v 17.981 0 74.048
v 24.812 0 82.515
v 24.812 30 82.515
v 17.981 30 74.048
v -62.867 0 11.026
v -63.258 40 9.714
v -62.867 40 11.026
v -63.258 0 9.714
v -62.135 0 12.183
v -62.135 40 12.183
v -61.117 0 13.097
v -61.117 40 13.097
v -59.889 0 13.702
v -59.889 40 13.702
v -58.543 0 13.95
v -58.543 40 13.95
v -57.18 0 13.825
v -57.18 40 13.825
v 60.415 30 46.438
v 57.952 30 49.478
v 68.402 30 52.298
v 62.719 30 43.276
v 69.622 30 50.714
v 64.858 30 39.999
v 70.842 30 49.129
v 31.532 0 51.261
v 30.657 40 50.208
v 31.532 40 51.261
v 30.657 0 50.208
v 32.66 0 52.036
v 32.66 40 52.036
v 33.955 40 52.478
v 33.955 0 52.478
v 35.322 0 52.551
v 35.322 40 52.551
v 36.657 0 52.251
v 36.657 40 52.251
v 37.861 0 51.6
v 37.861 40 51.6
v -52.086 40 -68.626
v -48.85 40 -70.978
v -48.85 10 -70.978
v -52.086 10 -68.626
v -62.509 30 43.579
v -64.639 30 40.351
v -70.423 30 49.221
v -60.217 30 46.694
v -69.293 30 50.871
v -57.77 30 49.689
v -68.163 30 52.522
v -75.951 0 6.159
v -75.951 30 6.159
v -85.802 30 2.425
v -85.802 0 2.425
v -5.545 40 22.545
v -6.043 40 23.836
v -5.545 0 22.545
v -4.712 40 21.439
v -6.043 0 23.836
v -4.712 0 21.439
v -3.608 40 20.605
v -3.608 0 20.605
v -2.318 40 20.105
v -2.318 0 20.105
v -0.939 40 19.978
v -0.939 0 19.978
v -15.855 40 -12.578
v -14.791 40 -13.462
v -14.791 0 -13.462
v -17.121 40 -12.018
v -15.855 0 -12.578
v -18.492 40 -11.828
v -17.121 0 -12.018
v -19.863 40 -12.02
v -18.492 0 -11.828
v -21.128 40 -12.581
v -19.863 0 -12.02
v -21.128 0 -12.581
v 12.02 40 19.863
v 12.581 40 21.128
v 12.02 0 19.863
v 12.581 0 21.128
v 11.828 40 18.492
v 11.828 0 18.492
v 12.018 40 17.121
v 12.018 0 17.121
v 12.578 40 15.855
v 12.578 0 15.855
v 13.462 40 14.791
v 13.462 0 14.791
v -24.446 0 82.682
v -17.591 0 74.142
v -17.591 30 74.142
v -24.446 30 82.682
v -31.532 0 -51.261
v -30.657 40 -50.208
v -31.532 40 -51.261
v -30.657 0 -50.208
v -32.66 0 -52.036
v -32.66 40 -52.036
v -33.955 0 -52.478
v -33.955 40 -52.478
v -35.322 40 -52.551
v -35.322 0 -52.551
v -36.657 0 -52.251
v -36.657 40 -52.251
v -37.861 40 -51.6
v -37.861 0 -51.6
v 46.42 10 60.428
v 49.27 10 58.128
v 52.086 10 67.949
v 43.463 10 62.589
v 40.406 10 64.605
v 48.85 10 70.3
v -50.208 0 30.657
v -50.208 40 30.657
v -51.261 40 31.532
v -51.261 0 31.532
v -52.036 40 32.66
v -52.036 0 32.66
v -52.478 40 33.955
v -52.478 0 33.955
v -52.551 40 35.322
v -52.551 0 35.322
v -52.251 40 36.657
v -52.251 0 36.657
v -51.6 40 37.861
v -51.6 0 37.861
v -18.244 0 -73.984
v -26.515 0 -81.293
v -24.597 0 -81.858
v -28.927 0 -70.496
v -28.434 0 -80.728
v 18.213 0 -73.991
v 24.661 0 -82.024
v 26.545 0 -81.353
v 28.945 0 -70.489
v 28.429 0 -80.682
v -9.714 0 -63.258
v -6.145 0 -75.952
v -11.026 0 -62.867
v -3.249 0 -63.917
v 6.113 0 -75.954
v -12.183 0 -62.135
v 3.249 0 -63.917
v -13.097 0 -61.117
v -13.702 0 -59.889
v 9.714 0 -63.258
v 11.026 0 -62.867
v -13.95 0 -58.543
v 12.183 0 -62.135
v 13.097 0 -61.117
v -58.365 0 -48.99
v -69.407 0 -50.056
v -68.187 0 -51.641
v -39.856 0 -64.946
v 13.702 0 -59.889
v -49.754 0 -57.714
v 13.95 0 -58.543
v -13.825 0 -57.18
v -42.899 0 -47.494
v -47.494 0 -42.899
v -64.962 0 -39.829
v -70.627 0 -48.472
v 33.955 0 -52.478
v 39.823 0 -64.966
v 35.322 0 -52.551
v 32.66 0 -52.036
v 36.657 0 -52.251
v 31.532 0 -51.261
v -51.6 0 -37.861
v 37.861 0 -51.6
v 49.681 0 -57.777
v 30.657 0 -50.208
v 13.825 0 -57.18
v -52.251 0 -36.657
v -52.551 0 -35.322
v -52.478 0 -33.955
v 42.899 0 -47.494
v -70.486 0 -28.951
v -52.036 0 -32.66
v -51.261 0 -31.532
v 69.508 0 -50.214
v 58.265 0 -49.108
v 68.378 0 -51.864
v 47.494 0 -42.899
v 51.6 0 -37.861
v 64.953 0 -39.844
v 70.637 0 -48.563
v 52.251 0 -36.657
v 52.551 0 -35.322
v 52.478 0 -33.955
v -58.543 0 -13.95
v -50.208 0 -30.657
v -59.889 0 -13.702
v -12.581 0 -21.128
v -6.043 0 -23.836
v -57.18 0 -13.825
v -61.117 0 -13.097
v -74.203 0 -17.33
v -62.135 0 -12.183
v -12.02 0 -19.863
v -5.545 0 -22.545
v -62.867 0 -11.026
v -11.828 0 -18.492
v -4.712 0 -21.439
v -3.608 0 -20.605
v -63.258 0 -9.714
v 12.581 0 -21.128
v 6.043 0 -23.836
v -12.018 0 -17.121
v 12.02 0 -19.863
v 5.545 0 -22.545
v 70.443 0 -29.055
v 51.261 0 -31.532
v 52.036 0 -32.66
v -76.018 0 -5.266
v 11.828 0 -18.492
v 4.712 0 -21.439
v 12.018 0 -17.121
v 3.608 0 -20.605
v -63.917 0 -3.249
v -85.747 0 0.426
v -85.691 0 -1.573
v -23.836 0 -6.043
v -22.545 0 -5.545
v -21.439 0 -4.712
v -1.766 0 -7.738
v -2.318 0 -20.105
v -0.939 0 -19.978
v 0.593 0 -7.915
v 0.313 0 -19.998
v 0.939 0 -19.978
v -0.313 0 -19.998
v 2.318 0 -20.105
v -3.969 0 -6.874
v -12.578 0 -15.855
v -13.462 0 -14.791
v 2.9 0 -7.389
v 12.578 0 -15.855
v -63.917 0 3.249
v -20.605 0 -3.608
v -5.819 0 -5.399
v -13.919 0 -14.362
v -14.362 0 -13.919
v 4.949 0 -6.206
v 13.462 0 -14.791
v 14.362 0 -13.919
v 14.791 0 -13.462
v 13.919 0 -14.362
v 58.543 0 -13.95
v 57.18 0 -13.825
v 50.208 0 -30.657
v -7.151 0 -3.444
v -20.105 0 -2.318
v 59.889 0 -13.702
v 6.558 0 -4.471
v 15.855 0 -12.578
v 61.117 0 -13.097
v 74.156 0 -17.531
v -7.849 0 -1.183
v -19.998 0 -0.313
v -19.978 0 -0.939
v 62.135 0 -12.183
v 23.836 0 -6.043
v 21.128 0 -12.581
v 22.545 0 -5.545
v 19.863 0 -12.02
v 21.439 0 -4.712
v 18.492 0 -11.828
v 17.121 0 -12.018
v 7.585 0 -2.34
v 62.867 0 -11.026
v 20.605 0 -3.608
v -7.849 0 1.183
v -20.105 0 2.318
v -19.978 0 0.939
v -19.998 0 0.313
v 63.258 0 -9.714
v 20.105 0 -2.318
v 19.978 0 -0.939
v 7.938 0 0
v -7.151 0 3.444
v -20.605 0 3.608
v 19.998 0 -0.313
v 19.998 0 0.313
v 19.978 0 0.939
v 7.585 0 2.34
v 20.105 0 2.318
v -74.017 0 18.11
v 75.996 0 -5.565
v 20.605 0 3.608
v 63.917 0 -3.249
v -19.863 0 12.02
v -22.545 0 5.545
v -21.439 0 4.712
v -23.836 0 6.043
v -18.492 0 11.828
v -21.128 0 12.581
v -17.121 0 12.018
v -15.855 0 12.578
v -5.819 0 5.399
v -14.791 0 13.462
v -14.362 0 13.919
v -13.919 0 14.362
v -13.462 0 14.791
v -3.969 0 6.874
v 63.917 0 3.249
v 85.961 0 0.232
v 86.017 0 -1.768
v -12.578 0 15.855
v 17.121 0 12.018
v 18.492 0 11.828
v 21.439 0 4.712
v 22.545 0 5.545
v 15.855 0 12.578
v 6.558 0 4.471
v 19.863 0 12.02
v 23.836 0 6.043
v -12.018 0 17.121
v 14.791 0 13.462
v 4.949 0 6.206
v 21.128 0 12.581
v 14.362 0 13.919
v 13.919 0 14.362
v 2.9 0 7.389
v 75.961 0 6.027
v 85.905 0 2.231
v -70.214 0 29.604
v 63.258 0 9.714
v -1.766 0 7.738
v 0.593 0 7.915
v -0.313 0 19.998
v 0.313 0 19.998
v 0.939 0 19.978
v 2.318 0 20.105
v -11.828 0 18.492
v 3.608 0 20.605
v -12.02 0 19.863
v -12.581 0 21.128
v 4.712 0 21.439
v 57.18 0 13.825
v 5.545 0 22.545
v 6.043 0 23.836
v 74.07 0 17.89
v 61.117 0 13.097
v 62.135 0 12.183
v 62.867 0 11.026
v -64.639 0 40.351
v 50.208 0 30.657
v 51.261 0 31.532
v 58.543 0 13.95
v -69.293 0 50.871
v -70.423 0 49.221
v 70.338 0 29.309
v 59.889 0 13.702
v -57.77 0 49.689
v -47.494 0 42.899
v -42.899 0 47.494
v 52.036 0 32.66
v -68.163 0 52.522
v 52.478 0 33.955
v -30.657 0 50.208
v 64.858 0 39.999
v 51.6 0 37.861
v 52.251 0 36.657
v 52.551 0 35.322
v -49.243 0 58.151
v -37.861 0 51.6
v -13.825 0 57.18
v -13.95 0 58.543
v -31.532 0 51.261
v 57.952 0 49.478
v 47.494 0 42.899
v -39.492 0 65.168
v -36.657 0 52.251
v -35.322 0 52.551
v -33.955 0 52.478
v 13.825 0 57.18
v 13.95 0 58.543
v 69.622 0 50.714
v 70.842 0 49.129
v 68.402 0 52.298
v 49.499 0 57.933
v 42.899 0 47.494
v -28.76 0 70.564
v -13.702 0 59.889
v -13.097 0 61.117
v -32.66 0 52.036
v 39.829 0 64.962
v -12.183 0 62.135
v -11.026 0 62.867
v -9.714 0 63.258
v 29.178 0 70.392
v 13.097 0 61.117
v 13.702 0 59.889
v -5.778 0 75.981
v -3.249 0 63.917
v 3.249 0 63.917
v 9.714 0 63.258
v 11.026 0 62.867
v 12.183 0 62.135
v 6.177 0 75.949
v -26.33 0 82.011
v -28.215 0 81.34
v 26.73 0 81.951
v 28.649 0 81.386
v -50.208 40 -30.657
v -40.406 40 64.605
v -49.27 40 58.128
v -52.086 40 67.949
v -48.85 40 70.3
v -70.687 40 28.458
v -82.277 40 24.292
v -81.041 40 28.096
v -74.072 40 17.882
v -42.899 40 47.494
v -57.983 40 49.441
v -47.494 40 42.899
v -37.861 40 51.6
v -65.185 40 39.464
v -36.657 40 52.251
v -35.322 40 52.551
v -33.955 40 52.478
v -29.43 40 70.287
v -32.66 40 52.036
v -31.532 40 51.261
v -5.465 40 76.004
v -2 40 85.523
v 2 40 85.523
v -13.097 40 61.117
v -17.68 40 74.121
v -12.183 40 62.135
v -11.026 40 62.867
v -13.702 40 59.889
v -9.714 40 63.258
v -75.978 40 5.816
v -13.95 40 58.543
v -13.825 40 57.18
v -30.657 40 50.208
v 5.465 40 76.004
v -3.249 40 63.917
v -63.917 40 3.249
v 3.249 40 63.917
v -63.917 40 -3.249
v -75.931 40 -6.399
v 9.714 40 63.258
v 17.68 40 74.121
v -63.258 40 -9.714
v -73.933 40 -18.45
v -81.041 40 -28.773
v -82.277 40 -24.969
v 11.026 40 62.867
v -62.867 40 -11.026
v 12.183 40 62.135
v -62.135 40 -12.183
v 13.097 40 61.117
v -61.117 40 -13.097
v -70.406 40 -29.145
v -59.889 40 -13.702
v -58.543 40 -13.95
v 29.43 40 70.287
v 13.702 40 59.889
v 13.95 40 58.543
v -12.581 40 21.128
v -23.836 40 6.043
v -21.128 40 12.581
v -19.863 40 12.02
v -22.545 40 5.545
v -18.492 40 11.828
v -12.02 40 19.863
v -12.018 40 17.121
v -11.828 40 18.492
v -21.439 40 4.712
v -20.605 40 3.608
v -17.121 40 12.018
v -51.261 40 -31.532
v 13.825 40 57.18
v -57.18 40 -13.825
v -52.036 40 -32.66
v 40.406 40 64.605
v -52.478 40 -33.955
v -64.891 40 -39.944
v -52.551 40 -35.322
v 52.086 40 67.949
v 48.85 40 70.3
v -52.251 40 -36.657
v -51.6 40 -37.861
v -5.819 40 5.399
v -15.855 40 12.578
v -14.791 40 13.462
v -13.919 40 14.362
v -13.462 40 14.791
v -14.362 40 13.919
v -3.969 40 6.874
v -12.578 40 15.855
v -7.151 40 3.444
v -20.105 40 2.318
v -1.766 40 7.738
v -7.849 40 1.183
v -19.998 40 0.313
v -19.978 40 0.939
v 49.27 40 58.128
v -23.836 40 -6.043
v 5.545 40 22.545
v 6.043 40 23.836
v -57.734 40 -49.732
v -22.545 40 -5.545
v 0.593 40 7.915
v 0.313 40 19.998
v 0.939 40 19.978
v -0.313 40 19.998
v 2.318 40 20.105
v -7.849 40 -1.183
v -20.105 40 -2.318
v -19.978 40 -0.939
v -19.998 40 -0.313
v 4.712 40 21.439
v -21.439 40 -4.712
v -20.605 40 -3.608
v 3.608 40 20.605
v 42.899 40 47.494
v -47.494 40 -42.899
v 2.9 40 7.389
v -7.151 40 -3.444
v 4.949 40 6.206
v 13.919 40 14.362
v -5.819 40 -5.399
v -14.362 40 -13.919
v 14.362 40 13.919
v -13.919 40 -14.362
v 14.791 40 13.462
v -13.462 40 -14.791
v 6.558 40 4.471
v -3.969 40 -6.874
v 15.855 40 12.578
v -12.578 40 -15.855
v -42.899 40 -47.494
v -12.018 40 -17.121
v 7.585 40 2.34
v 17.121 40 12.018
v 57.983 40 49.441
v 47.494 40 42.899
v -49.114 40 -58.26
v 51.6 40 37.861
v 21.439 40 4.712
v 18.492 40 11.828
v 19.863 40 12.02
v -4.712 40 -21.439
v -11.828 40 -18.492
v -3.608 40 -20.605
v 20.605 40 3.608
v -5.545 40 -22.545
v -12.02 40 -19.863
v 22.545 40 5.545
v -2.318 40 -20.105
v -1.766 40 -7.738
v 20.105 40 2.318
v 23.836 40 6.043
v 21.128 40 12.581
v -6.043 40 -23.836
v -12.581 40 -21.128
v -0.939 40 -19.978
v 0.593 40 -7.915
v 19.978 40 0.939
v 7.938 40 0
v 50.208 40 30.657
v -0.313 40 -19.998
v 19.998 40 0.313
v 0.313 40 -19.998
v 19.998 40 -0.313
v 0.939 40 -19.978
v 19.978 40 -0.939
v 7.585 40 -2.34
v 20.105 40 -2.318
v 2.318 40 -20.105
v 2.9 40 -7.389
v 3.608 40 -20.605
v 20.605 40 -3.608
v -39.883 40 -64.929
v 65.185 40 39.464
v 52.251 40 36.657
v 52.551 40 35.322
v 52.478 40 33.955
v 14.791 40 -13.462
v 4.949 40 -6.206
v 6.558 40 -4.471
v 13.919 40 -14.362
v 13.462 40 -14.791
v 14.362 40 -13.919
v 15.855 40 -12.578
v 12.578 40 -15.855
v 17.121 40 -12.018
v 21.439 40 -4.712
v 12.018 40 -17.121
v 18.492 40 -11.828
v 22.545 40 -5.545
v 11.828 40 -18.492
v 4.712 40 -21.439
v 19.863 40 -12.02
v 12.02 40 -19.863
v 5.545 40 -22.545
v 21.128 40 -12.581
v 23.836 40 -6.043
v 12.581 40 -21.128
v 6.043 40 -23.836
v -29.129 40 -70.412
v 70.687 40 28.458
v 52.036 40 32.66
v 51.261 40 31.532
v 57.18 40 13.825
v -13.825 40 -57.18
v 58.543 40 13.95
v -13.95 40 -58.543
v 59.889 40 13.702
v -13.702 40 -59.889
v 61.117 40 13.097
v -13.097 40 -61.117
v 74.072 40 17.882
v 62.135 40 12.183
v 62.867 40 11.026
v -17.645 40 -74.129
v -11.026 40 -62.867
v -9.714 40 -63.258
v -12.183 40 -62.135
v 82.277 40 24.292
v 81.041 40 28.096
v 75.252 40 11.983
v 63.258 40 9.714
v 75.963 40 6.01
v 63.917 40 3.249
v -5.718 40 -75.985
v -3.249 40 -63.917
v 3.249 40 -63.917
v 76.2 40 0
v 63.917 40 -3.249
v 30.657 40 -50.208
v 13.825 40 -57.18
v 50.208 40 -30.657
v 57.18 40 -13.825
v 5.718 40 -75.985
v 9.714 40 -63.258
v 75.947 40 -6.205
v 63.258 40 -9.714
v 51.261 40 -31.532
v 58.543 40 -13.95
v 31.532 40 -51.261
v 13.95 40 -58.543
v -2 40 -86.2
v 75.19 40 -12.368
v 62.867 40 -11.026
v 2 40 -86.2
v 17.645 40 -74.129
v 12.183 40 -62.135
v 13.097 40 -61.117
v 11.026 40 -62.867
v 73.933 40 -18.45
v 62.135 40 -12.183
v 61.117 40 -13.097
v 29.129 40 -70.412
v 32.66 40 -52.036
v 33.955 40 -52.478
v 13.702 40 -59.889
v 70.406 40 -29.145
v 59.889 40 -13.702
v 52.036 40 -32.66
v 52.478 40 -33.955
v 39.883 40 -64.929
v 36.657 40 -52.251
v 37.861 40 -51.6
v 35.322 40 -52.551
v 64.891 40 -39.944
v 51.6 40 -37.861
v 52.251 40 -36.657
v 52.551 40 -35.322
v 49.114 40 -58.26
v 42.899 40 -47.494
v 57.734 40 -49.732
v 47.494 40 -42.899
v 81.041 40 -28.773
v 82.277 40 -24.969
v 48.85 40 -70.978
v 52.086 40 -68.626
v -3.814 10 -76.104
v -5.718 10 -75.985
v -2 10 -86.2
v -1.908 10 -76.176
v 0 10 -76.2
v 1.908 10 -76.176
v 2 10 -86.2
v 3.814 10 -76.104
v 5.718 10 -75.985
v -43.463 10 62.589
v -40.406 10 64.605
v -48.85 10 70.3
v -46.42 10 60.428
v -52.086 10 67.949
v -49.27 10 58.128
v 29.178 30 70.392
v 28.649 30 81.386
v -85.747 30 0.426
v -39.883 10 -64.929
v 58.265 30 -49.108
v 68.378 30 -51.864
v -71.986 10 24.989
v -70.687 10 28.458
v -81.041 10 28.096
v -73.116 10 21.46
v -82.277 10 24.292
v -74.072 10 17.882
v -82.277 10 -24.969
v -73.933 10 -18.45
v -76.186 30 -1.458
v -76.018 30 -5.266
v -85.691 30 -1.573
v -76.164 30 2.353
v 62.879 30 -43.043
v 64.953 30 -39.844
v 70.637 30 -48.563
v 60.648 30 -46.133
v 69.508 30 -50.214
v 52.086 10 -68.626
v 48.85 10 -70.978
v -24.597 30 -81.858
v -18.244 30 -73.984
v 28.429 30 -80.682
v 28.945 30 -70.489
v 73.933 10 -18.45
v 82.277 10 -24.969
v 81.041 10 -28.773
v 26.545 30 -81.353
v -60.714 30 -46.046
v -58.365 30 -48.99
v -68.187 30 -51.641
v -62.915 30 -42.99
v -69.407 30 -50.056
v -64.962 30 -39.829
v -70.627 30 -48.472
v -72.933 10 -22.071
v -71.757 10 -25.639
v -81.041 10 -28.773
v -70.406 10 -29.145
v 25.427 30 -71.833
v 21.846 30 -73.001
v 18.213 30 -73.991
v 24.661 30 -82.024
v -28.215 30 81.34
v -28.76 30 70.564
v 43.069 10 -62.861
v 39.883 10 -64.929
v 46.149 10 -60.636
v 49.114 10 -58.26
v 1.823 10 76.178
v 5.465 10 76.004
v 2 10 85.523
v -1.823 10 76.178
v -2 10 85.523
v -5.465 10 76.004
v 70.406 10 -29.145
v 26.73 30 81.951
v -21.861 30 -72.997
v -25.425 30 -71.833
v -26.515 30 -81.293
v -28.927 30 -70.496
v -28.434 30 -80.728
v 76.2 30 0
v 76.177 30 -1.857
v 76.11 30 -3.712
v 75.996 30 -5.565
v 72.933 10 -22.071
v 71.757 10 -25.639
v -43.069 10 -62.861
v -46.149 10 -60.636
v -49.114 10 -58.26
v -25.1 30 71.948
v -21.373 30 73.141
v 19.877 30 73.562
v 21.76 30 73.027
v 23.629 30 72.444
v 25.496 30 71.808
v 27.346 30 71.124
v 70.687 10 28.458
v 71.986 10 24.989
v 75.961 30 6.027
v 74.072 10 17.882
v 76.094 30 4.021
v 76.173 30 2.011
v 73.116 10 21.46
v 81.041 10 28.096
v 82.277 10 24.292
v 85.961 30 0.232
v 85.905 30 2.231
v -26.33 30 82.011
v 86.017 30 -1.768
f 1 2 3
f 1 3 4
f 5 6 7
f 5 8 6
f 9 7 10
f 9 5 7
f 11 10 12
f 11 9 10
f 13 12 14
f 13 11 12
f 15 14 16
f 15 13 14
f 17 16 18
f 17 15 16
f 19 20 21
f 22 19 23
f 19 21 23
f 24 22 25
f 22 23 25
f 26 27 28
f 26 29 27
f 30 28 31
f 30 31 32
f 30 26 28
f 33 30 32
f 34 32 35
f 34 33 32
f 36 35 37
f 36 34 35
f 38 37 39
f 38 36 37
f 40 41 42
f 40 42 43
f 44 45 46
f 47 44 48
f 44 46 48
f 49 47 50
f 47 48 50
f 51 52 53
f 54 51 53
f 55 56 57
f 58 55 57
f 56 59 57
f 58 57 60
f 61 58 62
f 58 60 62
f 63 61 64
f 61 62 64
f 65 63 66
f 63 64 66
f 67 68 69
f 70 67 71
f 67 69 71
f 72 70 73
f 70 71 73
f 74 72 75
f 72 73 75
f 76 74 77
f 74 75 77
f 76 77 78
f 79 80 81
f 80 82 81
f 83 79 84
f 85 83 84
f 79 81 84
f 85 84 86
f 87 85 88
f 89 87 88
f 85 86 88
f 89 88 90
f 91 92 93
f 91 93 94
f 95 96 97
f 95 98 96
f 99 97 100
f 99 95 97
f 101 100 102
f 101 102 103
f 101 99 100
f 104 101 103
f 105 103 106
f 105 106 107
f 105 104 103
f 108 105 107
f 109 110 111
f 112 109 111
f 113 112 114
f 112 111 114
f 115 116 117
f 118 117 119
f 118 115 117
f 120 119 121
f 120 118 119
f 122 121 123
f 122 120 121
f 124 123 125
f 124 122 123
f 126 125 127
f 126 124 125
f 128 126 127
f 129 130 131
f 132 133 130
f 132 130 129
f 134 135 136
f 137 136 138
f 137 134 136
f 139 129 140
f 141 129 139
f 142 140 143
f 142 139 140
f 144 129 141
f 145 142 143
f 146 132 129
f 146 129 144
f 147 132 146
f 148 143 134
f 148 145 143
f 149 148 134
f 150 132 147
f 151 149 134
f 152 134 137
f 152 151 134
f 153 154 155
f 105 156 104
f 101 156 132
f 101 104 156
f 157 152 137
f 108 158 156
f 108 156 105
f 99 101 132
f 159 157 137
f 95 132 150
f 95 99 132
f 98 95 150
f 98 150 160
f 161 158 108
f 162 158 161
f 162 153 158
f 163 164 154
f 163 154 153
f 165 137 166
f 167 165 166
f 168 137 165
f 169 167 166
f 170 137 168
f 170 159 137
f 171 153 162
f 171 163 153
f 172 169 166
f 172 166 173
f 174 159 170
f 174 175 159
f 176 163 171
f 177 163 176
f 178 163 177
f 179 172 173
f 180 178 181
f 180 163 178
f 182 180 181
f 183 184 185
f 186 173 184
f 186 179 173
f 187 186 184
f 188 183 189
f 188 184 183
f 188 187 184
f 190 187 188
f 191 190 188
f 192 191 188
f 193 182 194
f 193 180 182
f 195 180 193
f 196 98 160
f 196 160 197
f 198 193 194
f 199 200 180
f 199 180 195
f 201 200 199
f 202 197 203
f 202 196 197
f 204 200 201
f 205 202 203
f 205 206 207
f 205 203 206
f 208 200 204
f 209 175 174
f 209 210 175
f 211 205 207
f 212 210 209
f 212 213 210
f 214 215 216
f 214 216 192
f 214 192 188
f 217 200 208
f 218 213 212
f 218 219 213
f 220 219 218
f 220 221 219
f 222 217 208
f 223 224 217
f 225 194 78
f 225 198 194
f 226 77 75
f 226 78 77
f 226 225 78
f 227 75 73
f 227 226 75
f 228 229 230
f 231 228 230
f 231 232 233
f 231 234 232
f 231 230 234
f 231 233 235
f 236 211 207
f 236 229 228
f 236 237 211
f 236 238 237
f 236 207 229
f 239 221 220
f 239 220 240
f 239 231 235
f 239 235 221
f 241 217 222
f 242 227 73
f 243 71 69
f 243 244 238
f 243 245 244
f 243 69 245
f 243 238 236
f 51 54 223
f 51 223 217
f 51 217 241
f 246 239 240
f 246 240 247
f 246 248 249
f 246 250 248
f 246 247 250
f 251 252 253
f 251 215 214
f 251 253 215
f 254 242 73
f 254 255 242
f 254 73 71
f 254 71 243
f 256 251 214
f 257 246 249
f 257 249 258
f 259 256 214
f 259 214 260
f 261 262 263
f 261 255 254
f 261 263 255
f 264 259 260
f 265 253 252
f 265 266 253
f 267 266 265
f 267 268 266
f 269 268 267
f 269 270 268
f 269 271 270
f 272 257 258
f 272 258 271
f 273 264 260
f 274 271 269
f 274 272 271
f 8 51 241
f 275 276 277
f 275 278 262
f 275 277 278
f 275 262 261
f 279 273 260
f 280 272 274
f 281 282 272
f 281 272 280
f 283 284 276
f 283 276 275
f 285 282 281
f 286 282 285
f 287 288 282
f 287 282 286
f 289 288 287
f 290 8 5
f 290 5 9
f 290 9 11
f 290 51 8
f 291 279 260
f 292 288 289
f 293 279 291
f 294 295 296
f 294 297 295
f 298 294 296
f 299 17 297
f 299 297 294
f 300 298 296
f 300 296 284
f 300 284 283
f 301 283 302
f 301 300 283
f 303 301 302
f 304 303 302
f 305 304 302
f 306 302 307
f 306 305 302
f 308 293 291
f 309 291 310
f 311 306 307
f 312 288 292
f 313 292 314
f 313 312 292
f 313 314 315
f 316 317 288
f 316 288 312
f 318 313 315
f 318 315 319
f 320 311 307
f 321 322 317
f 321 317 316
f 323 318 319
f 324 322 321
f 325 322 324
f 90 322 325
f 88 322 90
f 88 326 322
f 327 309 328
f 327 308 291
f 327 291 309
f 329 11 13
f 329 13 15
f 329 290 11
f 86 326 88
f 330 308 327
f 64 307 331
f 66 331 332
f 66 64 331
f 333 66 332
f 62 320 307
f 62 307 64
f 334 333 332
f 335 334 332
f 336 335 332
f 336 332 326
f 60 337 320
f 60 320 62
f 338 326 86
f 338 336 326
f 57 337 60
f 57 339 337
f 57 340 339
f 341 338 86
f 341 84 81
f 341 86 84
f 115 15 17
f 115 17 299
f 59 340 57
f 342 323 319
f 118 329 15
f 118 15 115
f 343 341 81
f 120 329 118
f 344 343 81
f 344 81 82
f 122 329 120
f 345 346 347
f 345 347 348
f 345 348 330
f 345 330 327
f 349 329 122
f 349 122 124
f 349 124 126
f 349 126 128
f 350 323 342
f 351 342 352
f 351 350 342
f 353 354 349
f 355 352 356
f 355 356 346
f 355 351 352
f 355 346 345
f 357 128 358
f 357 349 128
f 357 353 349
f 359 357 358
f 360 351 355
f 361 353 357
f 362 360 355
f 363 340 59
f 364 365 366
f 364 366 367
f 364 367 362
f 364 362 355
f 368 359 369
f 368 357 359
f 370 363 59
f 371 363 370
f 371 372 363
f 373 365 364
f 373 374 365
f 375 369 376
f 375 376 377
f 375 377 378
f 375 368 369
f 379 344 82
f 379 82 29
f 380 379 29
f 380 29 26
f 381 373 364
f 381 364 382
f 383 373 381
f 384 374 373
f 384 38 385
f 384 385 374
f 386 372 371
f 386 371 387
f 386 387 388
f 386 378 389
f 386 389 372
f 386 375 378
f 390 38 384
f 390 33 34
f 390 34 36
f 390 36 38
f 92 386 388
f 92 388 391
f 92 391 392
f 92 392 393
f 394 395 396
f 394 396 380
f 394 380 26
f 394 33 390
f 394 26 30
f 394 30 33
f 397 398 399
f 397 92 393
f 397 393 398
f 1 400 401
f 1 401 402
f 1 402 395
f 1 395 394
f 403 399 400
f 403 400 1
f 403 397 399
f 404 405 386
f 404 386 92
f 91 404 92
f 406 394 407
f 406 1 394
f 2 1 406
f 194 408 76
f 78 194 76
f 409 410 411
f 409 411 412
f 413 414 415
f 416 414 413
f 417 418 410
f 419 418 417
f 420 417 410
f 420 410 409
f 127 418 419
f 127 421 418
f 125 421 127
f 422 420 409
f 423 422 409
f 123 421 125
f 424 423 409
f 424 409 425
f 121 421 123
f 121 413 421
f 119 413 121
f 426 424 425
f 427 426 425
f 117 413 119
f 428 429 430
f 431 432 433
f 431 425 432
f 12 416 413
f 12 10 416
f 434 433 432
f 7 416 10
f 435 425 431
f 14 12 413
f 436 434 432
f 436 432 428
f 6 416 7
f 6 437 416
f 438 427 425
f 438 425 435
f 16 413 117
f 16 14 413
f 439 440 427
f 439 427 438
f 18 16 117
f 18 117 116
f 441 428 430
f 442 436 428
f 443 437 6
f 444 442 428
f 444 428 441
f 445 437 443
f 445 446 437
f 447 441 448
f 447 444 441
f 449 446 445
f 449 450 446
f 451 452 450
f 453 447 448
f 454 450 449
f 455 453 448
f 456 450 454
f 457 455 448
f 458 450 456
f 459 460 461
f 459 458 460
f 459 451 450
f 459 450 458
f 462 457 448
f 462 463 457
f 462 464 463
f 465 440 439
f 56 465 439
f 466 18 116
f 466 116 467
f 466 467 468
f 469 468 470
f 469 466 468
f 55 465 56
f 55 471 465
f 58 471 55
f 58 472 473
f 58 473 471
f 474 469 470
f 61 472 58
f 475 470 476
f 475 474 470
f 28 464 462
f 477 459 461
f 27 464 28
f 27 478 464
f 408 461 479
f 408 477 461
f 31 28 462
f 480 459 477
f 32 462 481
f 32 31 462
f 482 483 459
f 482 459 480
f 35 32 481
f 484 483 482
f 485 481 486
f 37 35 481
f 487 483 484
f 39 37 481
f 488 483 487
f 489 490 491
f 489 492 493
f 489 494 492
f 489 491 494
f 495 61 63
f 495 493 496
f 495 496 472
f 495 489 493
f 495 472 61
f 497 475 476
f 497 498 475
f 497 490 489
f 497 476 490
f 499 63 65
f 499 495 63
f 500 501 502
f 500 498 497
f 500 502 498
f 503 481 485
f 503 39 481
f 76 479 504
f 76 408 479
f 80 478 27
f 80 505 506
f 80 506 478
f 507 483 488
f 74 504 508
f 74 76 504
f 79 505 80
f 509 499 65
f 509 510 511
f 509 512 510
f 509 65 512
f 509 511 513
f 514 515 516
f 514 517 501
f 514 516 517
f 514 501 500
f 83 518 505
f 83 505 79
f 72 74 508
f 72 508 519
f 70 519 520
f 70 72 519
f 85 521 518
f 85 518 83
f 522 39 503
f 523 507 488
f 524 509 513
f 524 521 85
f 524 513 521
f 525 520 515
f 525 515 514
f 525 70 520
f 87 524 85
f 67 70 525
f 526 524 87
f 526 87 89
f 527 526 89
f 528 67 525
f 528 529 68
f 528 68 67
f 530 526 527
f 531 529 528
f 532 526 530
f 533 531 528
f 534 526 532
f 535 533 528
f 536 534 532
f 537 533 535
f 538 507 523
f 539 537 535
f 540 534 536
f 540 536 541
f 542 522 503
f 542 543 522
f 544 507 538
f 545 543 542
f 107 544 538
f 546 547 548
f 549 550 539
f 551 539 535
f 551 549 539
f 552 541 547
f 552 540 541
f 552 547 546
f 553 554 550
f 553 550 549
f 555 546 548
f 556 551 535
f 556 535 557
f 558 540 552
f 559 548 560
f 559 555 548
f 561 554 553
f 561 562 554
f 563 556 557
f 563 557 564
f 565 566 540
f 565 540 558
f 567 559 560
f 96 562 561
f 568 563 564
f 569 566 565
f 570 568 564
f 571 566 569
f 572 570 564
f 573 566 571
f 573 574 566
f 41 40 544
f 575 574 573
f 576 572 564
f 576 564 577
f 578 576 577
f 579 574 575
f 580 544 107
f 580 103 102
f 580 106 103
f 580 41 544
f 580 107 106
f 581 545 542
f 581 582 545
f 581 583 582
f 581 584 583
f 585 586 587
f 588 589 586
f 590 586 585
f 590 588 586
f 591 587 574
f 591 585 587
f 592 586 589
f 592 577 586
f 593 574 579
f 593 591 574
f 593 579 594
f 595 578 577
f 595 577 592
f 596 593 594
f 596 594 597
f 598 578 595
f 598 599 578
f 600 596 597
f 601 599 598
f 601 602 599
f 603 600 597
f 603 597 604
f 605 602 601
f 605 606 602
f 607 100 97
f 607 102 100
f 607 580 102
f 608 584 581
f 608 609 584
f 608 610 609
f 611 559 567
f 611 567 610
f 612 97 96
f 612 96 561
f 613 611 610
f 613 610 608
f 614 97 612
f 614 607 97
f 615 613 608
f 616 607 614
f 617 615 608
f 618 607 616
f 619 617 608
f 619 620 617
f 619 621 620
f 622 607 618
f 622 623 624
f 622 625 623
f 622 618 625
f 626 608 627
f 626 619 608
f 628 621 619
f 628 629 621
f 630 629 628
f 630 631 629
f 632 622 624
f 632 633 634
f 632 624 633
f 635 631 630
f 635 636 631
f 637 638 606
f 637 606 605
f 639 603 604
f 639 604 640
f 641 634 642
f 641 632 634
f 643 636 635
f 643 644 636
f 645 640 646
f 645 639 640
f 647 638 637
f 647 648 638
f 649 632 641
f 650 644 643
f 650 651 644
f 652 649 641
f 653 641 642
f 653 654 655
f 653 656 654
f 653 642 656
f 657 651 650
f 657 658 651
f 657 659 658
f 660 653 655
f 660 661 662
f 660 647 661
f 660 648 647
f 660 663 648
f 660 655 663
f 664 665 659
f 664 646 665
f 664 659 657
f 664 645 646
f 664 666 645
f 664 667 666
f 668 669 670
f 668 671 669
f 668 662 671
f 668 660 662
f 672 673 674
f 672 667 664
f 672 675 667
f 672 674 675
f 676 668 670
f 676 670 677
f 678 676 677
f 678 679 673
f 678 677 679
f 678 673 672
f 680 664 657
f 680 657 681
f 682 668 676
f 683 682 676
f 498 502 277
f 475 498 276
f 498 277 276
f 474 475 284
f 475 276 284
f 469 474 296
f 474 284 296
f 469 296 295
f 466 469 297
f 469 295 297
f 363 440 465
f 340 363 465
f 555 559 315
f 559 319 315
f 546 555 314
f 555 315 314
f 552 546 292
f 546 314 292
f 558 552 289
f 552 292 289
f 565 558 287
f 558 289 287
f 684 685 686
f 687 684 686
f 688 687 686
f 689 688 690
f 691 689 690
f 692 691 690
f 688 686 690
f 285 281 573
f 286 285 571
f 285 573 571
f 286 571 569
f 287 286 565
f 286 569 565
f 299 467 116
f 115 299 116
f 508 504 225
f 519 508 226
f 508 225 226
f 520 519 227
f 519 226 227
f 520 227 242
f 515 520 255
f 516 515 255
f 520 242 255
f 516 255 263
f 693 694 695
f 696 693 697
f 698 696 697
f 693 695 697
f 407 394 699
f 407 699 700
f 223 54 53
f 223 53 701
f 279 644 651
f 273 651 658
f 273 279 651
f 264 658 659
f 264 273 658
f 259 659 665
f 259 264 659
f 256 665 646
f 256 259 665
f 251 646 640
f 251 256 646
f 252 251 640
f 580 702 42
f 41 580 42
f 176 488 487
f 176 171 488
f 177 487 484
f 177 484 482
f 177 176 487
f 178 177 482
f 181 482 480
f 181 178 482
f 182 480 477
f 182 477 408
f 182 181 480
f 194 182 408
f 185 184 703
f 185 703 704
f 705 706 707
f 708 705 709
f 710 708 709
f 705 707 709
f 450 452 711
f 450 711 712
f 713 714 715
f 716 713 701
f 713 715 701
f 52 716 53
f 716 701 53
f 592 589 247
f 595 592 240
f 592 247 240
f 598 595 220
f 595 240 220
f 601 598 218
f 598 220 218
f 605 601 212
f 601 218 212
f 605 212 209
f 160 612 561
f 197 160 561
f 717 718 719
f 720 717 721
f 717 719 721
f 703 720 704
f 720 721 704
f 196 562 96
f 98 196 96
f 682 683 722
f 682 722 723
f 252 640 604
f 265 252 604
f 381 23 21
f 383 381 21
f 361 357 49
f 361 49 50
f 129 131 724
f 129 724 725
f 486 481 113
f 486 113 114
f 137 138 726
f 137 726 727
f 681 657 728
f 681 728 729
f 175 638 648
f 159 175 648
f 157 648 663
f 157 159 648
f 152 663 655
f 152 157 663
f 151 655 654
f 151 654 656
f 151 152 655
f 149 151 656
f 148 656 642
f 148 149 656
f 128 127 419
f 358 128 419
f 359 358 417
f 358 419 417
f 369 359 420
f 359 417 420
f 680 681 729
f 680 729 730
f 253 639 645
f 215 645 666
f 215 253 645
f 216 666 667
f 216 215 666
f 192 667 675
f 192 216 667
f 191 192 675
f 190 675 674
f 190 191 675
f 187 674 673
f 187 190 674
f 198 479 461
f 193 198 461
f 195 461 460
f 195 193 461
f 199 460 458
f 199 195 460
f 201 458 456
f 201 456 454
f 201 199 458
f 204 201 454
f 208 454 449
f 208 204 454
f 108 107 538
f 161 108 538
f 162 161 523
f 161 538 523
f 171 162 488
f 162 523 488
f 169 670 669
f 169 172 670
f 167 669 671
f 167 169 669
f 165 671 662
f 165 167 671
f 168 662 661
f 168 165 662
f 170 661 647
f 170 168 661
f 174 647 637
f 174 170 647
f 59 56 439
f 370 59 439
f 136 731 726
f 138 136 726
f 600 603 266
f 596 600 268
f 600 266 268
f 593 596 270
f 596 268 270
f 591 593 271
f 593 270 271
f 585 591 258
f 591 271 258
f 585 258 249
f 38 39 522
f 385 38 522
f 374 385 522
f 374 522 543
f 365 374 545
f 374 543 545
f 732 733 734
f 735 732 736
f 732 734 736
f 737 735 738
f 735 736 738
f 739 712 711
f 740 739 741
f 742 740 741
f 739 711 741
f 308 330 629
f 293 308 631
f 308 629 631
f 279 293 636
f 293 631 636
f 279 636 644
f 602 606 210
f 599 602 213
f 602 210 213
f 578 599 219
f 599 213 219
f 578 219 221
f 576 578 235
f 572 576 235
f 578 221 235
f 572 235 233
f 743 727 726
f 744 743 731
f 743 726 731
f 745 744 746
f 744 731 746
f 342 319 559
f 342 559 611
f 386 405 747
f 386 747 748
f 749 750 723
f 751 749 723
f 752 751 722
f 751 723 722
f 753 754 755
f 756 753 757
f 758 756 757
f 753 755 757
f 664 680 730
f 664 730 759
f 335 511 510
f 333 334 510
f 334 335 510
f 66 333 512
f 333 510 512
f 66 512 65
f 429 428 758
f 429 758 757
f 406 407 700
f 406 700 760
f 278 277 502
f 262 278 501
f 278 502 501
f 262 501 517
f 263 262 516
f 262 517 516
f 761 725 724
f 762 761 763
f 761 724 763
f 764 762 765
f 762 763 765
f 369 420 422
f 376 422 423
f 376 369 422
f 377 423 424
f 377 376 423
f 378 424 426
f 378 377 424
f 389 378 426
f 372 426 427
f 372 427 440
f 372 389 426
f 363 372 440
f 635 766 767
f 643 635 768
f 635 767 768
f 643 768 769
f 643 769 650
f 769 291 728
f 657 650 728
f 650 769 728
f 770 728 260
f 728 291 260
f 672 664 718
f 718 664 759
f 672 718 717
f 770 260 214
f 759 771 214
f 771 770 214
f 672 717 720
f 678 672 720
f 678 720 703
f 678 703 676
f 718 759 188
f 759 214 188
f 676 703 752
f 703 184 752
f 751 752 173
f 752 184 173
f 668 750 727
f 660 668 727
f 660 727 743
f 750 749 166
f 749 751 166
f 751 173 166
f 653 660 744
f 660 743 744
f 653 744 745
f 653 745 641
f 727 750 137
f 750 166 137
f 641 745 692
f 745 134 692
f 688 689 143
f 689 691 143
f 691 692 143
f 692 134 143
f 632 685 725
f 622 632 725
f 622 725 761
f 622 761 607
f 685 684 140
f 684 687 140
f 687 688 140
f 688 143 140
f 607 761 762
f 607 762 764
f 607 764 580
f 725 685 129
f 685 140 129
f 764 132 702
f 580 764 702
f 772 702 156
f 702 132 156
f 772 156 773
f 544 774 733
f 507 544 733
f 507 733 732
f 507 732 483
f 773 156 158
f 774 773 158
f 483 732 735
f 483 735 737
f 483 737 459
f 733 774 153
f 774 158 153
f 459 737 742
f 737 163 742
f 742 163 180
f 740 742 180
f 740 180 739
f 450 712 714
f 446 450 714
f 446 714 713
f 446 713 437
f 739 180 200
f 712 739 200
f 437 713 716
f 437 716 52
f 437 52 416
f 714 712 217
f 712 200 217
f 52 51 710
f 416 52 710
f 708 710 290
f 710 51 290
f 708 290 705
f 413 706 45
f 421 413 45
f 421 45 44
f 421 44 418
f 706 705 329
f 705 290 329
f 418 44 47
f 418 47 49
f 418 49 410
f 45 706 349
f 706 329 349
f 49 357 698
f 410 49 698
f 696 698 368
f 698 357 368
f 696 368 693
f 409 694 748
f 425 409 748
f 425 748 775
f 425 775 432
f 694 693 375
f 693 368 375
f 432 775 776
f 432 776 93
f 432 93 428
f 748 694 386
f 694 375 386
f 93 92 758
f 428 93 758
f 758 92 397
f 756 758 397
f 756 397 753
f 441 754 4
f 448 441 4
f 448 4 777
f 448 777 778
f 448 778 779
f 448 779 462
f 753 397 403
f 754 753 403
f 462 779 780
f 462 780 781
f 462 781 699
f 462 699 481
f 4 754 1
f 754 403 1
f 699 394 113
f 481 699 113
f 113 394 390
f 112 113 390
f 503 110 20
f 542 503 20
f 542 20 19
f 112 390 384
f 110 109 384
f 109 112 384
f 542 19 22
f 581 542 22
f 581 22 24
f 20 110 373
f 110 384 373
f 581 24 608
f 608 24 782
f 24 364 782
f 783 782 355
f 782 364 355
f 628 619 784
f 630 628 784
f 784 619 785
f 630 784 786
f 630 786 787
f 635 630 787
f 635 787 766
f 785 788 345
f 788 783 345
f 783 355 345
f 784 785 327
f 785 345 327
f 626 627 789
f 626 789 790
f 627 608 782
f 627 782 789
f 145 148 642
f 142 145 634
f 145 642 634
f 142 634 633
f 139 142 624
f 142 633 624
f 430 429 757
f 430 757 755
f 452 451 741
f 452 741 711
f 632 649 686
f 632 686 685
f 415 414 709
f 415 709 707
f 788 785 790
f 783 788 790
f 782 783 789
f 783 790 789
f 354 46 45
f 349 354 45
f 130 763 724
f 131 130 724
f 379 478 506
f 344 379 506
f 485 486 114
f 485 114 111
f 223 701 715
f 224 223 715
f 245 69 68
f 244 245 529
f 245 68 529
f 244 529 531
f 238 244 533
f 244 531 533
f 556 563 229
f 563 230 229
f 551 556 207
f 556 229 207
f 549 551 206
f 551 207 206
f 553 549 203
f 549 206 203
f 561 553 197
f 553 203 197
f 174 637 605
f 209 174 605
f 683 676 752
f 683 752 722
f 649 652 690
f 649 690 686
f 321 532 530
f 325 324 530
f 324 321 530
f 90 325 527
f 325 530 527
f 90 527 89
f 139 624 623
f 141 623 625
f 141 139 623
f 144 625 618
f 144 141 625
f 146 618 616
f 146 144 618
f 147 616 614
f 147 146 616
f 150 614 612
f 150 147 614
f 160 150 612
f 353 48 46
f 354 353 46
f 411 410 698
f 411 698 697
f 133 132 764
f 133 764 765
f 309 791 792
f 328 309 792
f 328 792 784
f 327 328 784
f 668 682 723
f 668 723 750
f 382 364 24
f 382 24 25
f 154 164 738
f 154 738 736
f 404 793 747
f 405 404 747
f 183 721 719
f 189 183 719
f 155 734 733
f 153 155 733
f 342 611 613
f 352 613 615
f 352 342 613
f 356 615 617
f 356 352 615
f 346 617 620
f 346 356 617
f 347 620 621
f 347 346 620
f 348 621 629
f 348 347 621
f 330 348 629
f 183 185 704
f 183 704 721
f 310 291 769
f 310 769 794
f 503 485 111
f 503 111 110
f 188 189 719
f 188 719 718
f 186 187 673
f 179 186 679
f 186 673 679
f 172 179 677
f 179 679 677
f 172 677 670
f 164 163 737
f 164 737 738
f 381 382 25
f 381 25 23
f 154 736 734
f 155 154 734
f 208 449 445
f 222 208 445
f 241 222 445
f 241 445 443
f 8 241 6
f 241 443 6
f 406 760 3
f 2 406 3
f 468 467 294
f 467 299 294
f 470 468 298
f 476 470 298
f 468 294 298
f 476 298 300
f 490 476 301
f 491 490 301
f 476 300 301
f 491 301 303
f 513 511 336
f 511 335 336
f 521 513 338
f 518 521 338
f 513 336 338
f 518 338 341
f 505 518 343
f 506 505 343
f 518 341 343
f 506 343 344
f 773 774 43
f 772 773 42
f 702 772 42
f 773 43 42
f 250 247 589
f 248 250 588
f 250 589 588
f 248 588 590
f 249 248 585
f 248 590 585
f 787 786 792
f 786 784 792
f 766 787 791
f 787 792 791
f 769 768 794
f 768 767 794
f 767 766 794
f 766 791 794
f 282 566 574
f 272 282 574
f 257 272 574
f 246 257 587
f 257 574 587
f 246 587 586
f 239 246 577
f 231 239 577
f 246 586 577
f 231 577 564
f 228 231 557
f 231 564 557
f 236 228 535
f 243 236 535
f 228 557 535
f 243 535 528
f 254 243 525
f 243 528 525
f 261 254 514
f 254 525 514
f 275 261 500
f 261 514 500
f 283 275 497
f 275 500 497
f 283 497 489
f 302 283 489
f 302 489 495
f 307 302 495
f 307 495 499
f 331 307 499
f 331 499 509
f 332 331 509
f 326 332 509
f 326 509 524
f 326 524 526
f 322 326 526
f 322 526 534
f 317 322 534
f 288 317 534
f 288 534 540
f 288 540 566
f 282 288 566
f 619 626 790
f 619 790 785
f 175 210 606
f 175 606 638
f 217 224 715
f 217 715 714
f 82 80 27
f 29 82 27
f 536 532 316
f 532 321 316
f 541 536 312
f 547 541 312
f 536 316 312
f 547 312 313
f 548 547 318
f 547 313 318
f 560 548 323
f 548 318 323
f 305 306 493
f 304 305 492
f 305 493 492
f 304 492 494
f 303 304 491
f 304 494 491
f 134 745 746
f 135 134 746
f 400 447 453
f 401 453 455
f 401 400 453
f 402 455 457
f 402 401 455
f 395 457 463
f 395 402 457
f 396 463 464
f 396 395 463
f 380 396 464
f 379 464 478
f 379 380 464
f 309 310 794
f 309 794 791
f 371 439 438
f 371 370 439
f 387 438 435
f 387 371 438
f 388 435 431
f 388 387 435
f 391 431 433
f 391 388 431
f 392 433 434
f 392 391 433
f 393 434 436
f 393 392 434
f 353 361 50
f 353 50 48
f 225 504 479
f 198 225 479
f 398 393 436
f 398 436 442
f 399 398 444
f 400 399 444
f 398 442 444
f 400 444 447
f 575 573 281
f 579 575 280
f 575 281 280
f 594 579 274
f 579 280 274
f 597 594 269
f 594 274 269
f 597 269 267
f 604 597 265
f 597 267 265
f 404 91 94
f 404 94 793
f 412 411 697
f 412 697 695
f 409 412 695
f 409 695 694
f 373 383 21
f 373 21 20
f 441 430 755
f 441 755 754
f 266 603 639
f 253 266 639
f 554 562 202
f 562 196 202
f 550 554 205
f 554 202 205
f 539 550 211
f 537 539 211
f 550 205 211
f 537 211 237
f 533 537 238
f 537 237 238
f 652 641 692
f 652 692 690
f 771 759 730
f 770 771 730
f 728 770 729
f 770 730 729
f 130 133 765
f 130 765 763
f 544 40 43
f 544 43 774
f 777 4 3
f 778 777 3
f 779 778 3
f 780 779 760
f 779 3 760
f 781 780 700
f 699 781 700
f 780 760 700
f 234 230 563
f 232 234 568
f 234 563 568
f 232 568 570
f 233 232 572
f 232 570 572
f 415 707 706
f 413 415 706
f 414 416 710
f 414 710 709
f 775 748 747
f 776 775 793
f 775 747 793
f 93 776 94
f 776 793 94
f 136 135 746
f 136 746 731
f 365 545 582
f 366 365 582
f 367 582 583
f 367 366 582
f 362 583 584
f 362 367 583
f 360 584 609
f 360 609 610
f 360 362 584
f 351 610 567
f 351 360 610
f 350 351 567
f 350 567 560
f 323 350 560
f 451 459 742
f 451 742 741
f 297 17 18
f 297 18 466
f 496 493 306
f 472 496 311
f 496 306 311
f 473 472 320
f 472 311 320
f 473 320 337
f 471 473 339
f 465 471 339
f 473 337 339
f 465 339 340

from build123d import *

# Parameters (mm, degrees)
SKETCH1_R           = 76.2
BOSS_EXTRUDE1_DEPTH = 40
BOSS_EXTRUDE2_DEPTH = 30
CIRPATTERN1_COUNT   = 10
BOSS_EXTRUDE3_DEPTH = 30
CIRPATTERN2_COUNT   = 10
SKETCH4_R           = 7.9375
CUT_EXTRUDE1_DEPTH  = 41
CUT_EXTRUDE2_DEPTH  = 41
CIRPATTERN3_COUNT   = 8
FILLET4_R           = 5
FILLET5_R           = 5


with BuildPart() as part:
    # Sketch1 → Boss-Extrude1 (new body)
    with BuildSketch(Plane(origin=(0, 0, 0), x_dir=(1, 0, 0), z_dir=(0, 1, 0))):
        Circle(SKETCH1_R)
    extrude(amount=BOSS_EXTRUDE1_DEPTH)

    # Sketch2 → Boss-Extrude2 (add)
    with BuildSketch(Plane(origin=(0, 40, 0), x_dir=(1, 0, 0), z_dir=(0, 1, 0))):
        with BuildLine():
            Line((0, 86.2), (0, 76.2))
            ThreePointArc((0, 76.2), (2.860964701, 76.146272929), (5.717894985, 75.98516748))
            Line((5.717894985, 75.98516748), (2, 86.2))
            Line((2, 86.2), (0, 86.2))
        make_face()
        with BuildLine():
            ThreePointArc((-5.717894985, 75.98516748), (-2.860964701, 76.146272929), (0, 76.2))
            Line((0, 76.2), (0, 86.2))
            Line((0, 86.2), (-2, 86.2))
            Line((-2, 86.2), (-5.717894985, 75.98516748))
        make_face()
    boss_extrude2 = extrude(amount=-BOSS_EXTRUDE2_DEPTH)

    # CirPattern1: Boss-Extrude2 ×10 about axis
    cirpattern1_axis = Axis((0, 0, -0.338660651), (0, 1, 0))
    for i in range(1, CIRPATTERN1_COUNT):
        add(boss_extrude2.rotate(cirpattern1_axis, i * 360 / CIRPATTERN1_COUNT))

    # Sketch3 → Boss-Extrude3 (add)
    with BuildSketch(Plane.XZ):
        with BuildLine():
            Line((24.811616962, 82.515457643), (17.980532935, 74.048230468))
            ThreePointArc((17.980532935, 74.048230468), (20.820375524, 73.300422666), (23.629294983, 72.44374658))
            Line((23.629294983, 72.44374658), (26.73025233, 81.950799937))
            Line((26.73025233, 81.950799937), (24.811616962, 82.515457643))
        make_face()
        with BuildLine():
            Line((26.73025233, 81.950799937), (23.629294983, 72.44374658))
            ThreePointArc((23.629294983, 72.44374658), (26.423605423, 71.471904105), (29.178084826, 70.392324624))
            Line((29.178084826, 70.392324624), (28.648887698, 81.386142232))
            Line((28.648887698, 81.386142232), (26.73025233, 81.950799937))
        make_face()
    boss_extrude3 = extrude(amount=-BOSS_EXTRUDE3_DEPTH)

    # CirPattern2: Boss-Extrude3 ×10 about axis
    cirpattern2_axis = Axis((0.107387074, 0, 0.328898849), (0, 1, 0))
    for i in range(1, CIRPATTERN2_COUNT):
        add(boss_extrude3.rotate(cirpattern2_axis, i * 360 / CIRPATTERN2_COUNT))

    # Sketch4 → Cut-Extrude1 (cut, through all)
    with BuildSketch(Plane(origin=(0, 40, 0), x_dir=(1, 0, 0), z_dir=(0, 1, 0))):
        Circle(SKETCH4_R)
    extrude(amount=-CUT_EXTRUDE1_DEPTH, mode=Mode.SUBTRACT)

    # Sketch5 → Cut-Extrude2 (cut, through all)
    with BuildSketch(Plane(origin=(0, 40, 0), x_dir=(1, 0, 0), z_dir=(0, 1, 0))):
        with BuildLine():
            ThreePointArc((15, 62.217360921), (0, 64), (-15, 62.217360921))
            Line((-15, 62.217360921), (-5, 19.364916731))
            ThreePointArc((-5, 19.364916731), (0, 20), (5, 19.364916731))
            Line((5, 19.364916731), (15, 62.217360921))
        make_face()
    cut_extrude2 = extrude(amount=-CUT_EXTRUDE2_DEPTH, mode=Mode.SUBTRACT)

    # CirPattern3: Cut-Extrude2 ×8 about axis
    cirpattern3_axis = Axis((0, 0, 0), (0, 1, 0))
    for i in range(1, CIRPATTERN3_COUNT):
        add(cut_extrude2.rotate(cirpattern3_axis, i * 360 / CIRPATTERN3_COUNT), mode=Mode.SUBTRACT)

    # Fillet4
    fillet4_edges = [part.edges().sort_by_distance(p)[0] for p in [
        (5, 20, -19.364916731),
        (-5, 20, -19.364916731),
        (15, 20, -62.217360921),
        (-5, 20, 19.364916731),
        (5, 20, 19.364916731),
        (-15, 20, 62.217360921),
        (10.157530032, 20, 17.228597844),
        (17.228597844, 20, 10.157530032),
        (33.387716097, 20, 54.600919533),
        (-19.364916731, 20, -5),
        (-19.364916731, 20, 5),
        (-62.217360921, 20, -15),
        (-17.228597844, 20, 10.157530032),
        (-10.157530032, 20, 17.228597844),
        (-54.600919533, 20, 33.387716097),
        (17.228597844, 20, -10.157530032),
        (10.157530032, 20, -17.228597844),
        (54.600919533, 20, -33.387716097),
        (19.364916731, 20, 5),
        (19.364916731, 20, -5),
        (62.217360921, 20, 15),
        (-10.157530032, 20, -17.228597844),
        (-17.228597844, 20, -10.157530032),
        (-33.387716097, 20, -54.600919533),
    ]]
    fillet(fillet4_edges, radius=FILLET4_R)

    # Fillet5
    fillet5_edges = [part.edges().sort_by_distance(p)[0] for p in [
        (-15, 20, -62.217360921),
        (15, 20, 62.217360921),
        (54.600919533, 20, 33.387716097),
        (-62.217360921, 20, 15),
        (-33.387716097, 20, 54.600919533),
        (33.387716097, 20, -54.600919533),
        (62.217360921, 20, -15),
        (-54.600919533, 20, -33.387716097),
    ]]
    fillet(fillet5_edges, radius=FILLET5_R)


solid = part.part
